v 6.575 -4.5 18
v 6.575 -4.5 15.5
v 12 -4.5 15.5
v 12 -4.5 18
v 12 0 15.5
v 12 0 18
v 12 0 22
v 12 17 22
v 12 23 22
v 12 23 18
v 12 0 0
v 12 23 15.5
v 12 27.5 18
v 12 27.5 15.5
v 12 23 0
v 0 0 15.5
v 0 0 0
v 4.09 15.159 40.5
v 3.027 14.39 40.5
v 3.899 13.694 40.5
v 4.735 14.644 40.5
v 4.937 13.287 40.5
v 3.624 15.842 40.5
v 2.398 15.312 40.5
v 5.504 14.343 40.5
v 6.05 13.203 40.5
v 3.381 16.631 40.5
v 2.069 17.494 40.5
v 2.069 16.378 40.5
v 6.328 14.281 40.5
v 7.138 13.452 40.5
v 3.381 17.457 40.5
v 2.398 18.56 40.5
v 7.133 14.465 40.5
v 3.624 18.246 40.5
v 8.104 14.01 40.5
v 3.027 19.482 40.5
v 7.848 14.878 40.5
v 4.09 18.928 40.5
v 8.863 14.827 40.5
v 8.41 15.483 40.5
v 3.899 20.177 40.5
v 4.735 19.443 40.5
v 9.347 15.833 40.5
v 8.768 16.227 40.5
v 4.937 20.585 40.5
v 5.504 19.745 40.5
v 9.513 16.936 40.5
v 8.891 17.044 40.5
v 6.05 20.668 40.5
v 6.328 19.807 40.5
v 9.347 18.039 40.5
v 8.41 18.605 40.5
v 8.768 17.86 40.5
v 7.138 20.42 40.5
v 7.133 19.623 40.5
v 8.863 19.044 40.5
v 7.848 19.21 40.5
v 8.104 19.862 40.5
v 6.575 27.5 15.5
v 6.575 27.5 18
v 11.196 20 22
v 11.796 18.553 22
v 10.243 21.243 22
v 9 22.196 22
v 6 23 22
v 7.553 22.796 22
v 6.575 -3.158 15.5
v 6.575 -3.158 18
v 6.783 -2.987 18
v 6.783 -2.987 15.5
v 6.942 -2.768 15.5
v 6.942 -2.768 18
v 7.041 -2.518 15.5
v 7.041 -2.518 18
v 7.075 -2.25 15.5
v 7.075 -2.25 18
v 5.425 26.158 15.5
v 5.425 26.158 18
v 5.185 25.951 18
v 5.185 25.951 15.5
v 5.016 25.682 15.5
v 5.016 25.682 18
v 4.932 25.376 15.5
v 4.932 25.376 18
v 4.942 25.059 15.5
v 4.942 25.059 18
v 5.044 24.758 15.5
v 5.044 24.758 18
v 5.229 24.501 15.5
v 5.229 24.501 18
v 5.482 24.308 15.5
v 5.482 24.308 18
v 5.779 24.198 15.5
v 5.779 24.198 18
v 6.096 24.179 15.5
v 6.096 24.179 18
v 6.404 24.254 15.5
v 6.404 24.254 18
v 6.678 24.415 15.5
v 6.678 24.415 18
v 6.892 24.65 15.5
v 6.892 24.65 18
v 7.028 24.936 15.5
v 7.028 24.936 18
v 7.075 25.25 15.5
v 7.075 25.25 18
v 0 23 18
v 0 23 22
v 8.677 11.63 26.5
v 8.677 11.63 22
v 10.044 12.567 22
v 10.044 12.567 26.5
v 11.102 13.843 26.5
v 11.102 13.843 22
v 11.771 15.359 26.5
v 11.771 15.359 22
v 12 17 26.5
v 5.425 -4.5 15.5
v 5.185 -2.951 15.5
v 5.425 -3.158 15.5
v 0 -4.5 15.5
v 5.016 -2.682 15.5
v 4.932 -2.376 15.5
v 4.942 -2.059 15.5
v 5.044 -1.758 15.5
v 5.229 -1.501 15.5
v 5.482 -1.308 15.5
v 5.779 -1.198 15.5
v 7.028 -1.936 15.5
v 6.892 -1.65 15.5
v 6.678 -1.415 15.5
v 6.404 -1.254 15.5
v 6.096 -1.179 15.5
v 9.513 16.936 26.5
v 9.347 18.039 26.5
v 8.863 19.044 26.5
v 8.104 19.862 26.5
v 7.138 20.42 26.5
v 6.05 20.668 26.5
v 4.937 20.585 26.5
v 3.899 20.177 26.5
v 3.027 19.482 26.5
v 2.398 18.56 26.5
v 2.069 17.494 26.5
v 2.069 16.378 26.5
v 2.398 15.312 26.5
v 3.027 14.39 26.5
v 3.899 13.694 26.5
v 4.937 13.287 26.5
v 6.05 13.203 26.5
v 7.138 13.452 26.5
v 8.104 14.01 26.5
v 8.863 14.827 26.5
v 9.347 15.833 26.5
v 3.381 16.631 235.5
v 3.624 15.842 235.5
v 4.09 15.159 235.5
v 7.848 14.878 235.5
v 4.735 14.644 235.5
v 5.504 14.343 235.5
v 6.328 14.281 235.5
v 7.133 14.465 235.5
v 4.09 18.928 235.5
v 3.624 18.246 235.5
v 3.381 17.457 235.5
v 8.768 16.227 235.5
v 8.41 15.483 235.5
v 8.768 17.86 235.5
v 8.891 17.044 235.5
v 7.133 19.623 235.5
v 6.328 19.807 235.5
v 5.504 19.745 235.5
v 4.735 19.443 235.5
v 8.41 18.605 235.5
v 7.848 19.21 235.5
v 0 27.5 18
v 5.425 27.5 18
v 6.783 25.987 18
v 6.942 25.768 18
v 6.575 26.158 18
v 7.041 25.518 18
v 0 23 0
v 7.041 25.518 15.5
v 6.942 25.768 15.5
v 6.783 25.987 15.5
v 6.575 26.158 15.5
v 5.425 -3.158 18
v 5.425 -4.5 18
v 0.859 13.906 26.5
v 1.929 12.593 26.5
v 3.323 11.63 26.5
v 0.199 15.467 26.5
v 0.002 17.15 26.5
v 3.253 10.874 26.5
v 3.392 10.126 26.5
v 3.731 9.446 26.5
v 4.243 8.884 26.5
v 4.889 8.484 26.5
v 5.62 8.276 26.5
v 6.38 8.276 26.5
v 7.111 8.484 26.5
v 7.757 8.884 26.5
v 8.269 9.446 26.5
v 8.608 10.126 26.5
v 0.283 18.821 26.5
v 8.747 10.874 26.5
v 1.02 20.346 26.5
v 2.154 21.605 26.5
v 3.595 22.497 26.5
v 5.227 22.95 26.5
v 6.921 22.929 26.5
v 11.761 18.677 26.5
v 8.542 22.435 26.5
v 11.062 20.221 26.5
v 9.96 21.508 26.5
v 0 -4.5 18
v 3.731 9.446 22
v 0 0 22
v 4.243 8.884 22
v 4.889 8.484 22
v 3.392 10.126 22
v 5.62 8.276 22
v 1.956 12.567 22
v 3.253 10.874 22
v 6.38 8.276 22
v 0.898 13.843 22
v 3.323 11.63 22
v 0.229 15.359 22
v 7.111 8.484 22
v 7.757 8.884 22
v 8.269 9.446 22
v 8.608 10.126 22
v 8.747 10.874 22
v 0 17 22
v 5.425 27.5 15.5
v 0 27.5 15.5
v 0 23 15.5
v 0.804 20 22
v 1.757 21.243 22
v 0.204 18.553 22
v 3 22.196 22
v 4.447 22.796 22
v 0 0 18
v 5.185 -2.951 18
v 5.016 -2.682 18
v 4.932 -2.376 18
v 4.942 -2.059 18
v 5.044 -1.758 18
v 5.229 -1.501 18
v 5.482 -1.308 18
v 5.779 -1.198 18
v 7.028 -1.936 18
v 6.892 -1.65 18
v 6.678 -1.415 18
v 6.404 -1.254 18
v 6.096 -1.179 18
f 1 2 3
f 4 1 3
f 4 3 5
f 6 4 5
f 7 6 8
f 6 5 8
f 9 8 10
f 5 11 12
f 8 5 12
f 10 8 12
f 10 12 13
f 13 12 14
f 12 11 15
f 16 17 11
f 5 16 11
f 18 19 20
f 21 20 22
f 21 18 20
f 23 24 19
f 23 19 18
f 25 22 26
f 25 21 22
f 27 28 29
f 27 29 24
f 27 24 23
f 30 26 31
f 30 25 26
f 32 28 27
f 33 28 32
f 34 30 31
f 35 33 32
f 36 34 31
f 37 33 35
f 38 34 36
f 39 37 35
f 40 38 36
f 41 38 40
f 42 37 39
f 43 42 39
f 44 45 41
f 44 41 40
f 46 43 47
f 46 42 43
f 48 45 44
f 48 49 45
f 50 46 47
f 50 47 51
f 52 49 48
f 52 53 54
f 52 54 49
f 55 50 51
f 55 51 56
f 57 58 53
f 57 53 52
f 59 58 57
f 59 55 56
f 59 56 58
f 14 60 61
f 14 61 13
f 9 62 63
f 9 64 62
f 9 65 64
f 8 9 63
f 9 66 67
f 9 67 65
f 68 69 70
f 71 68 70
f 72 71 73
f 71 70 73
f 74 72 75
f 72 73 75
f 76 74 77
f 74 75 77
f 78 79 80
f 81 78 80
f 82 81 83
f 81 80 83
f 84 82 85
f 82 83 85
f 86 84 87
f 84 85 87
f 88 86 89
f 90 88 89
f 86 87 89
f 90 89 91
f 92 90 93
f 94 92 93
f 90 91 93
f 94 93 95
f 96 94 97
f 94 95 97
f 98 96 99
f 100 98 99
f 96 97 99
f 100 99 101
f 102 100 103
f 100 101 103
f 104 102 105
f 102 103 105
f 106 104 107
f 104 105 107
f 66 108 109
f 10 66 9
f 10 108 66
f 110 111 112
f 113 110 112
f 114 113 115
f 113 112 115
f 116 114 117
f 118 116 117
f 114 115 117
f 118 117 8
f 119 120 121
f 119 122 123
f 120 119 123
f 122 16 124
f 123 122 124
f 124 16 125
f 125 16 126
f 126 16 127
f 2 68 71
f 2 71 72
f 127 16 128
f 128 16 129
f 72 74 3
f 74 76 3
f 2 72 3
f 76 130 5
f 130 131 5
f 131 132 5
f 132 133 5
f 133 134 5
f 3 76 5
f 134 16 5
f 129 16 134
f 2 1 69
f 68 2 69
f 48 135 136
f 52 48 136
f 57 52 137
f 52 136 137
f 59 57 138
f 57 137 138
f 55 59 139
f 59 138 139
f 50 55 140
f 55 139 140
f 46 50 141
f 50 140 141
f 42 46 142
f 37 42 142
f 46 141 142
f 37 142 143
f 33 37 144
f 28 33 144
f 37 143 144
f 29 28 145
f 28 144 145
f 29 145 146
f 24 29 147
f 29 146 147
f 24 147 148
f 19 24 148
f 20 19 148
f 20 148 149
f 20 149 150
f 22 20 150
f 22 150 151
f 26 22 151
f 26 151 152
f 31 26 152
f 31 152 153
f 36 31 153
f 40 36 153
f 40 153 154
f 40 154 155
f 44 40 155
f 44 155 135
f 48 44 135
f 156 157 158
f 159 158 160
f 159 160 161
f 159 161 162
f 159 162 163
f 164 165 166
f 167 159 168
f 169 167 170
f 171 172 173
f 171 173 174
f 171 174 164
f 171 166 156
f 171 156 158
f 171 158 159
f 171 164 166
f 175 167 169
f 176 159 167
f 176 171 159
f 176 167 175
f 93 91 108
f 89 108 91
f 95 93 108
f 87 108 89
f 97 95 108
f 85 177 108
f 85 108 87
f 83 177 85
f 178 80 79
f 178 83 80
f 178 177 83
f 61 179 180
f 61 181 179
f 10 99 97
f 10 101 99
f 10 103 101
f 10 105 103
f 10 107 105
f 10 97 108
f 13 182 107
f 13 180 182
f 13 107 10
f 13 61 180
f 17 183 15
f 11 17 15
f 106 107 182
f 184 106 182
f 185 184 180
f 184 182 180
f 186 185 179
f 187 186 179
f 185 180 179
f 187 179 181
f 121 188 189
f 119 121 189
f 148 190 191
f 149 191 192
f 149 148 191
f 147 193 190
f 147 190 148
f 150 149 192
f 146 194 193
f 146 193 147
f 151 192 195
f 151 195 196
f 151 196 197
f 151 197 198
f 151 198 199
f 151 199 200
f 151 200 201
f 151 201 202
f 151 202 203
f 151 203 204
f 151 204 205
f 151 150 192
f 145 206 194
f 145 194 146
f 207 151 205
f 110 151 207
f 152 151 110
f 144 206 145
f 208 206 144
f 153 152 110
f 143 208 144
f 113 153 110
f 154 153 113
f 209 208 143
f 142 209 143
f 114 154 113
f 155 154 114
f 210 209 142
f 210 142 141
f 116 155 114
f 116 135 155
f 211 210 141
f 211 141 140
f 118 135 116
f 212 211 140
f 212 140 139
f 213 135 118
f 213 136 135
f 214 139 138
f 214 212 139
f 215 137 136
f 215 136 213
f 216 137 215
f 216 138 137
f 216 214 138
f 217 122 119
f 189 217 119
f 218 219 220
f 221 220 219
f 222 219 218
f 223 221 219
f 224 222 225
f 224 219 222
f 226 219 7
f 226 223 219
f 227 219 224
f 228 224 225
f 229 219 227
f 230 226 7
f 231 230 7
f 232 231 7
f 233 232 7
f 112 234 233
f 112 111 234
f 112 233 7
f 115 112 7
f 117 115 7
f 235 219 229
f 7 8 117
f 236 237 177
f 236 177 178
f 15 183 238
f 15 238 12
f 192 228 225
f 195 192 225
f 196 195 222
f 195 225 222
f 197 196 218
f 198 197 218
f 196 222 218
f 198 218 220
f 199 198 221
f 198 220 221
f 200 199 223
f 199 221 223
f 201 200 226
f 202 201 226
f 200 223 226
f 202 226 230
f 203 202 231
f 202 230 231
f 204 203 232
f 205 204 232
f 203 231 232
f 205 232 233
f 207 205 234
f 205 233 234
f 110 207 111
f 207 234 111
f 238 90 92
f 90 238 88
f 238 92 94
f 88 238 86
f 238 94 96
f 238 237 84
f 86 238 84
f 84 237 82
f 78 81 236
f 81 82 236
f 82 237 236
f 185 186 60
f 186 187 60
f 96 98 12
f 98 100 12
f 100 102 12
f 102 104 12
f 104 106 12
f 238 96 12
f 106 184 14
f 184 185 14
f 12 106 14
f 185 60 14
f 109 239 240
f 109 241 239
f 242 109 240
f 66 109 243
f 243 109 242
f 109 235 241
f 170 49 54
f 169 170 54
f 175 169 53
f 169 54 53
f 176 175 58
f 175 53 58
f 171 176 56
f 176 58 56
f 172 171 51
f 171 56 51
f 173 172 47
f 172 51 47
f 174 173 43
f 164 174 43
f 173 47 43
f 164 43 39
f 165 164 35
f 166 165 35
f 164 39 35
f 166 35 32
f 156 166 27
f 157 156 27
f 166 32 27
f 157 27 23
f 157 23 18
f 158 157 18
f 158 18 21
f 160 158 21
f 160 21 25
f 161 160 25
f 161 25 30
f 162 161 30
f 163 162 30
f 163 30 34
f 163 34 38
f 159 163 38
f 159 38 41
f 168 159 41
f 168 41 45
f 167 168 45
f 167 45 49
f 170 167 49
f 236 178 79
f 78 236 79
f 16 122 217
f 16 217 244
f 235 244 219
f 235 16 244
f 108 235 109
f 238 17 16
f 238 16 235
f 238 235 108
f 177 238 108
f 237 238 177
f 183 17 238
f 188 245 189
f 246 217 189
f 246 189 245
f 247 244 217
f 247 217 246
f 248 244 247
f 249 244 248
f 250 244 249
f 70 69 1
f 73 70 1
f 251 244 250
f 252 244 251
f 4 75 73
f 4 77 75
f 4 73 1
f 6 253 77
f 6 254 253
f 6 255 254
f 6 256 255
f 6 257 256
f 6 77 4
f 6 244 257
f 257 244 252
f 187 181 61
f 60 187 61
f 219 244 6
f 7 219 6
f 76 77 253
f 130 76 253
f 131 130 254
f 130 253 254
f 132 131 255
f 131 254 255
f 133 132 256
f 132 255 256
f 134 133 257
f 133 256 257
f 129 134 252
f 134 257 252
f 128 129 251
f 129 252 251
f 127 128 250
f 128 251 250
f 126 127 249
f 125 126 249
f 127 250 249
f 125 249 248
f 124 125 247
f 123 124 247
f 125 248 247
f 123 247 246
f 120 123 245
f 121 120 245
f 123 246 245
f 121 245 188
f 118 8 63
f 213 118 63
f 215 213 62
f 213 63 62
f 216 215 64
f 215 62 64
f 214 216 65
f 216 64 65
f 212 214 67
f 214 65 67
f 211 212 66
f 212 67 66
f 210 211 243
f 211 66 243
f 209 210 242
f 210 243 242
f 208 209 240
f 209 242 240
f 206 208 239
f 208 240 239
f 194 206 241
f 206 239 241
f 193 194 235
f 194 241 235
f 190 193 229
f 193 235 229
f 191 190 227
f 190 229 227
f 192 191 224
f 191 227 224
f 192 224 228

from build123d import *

# Parameters (mm, degrees)
F0_W      = 12
F0_H      = 23
F1_DEPTH  = 22
F3_W      = 12
F3_H      = 4.5
F4_DEPTH  = 2.5
F6_DEPTH  = 18.001
F8_DEPTH  = 4.5
F9_R      = 2.425
F10_DEPTH = 3
F11_R     = 3.742917
F12_DEPTH = 25
F13_R     = 2.770584
F14_DEPTH = 220


with BuildPart() as f1:
    # F0 (on Top) → F1 (new body)
    with BuildSketch(Plane.XY):
        with Locations((6, 11.5)):
            Rectangle(F0_W, F0_H)
    extrude(amount=F1_DEPTH)

    # F3 (on offset) → F4 (join)
    with BuildSketch(Plane.XY.offset(15.5)):
        with Locations((6, 25.25)):
            Rectangle(F3_W, F3_H)
        with Locations((6, -2.25)):
            Rectangle(F3_W, F3_H)
    extrude(amount=F4_DEPTH)

    # F5 (on face) → F6 (cut, through all)
    with BuildSketch(Plane.XY.offset(18)):
        with BuildLine():
            ThreePointArc((5.425, 26.158295), (5.481589, 24.30826), (7.075, 25.25))
            ThreePointArc((7.075, 25.25), (6.94174, 25.768411), (6.575, 26.158295))
            ThreePointArc((6.575, 26.158295), (6, 26.325), (5.425, 26.158295))
        make_face()
        with BuildLine():
            ThreePointArc((5.425, 26.158295), (6, 26.325), (6.575, 26.158295))
            Line((6.575, 26.158295), (6.575, 27.5))
            Line((6.575, 27.5), (5.425, 27.5))
            Line((5.425, 27.5), (5.425, 26.158295))
        make_face()
        with BuildLine():
            Line((5.425, -4.5), (6.575, -4.5))
            Line((6.575, -4.5), (6.575, -3.158295))
            ThreePointArc((6.575, -3.158295), (6, -3.325), (5.425, -3.158295))
            Line((5.425, -3.158295), (5.425, -4.5))
        make_face()
        with BuildLine():
            ThreePointArc((5.425, -3.158295), (6, -3.325), (6.575, -3.158295))
            ThreePointArc((6.575, -3.158295), (6.94174, -2.768411), (7.075, -2.25))
            ThreePointArc((7.075, -2.25), (5.481589, -1.30826), (5.425, -3.158295))
        make_face()
    extrude(amount=-F6_DEPTH, mode=Mode.SUBTRACT)

    # F7 (on face) → F8 (join)
    with BuildSketch(Plane.XY.offset(22)):
        with BuildLine():
            ThreePointArc((8.676815, 11.630208), (11.102004, 13.84254), (12, 17))
            ThreePointArc((12, 17), (2.84254, 22.102004), (3.323185, 11.630208))
            ThreePointArc((3.323185, 11.630208), (6, 11), (8.676815, 11.630208))
        make_face()
        with BuildLine():
            ThreePointArc((8.676815, 11.630208), (6, 11), (3.323185, 11.630208))
            ThreePointArc((3.323185, 11.630208), (6, 8.25), (8.676815, 11.630208))
        make_face()
    extrude(amount=F8_DEPTH)

    # F9 (on face) → F10 (join)
    with BuildSketch(Plane.XY.offset(26.5)):
        with Locations((6, 17)):
            Circle(F9_R)
    extrude(amount=F10_DEPTH)

    # F11 (on offset) → F12 (join)
    with BuildSketch(Plane.XY.offset(15.5)):
        with Locations((5.770345, 16.935842)):
            Circle(F11_R)
    extrude(amount=F12_DEPTH)

    # F13 (on offset) → F14 (join)
    with BuildSketch(Plane.XY.offset(15.5)):
        with Locations((6.120555, 17.043775)):
            Circle(F13_R)
    extrude(amount=F14_DEPTH)


solid = f1.part
